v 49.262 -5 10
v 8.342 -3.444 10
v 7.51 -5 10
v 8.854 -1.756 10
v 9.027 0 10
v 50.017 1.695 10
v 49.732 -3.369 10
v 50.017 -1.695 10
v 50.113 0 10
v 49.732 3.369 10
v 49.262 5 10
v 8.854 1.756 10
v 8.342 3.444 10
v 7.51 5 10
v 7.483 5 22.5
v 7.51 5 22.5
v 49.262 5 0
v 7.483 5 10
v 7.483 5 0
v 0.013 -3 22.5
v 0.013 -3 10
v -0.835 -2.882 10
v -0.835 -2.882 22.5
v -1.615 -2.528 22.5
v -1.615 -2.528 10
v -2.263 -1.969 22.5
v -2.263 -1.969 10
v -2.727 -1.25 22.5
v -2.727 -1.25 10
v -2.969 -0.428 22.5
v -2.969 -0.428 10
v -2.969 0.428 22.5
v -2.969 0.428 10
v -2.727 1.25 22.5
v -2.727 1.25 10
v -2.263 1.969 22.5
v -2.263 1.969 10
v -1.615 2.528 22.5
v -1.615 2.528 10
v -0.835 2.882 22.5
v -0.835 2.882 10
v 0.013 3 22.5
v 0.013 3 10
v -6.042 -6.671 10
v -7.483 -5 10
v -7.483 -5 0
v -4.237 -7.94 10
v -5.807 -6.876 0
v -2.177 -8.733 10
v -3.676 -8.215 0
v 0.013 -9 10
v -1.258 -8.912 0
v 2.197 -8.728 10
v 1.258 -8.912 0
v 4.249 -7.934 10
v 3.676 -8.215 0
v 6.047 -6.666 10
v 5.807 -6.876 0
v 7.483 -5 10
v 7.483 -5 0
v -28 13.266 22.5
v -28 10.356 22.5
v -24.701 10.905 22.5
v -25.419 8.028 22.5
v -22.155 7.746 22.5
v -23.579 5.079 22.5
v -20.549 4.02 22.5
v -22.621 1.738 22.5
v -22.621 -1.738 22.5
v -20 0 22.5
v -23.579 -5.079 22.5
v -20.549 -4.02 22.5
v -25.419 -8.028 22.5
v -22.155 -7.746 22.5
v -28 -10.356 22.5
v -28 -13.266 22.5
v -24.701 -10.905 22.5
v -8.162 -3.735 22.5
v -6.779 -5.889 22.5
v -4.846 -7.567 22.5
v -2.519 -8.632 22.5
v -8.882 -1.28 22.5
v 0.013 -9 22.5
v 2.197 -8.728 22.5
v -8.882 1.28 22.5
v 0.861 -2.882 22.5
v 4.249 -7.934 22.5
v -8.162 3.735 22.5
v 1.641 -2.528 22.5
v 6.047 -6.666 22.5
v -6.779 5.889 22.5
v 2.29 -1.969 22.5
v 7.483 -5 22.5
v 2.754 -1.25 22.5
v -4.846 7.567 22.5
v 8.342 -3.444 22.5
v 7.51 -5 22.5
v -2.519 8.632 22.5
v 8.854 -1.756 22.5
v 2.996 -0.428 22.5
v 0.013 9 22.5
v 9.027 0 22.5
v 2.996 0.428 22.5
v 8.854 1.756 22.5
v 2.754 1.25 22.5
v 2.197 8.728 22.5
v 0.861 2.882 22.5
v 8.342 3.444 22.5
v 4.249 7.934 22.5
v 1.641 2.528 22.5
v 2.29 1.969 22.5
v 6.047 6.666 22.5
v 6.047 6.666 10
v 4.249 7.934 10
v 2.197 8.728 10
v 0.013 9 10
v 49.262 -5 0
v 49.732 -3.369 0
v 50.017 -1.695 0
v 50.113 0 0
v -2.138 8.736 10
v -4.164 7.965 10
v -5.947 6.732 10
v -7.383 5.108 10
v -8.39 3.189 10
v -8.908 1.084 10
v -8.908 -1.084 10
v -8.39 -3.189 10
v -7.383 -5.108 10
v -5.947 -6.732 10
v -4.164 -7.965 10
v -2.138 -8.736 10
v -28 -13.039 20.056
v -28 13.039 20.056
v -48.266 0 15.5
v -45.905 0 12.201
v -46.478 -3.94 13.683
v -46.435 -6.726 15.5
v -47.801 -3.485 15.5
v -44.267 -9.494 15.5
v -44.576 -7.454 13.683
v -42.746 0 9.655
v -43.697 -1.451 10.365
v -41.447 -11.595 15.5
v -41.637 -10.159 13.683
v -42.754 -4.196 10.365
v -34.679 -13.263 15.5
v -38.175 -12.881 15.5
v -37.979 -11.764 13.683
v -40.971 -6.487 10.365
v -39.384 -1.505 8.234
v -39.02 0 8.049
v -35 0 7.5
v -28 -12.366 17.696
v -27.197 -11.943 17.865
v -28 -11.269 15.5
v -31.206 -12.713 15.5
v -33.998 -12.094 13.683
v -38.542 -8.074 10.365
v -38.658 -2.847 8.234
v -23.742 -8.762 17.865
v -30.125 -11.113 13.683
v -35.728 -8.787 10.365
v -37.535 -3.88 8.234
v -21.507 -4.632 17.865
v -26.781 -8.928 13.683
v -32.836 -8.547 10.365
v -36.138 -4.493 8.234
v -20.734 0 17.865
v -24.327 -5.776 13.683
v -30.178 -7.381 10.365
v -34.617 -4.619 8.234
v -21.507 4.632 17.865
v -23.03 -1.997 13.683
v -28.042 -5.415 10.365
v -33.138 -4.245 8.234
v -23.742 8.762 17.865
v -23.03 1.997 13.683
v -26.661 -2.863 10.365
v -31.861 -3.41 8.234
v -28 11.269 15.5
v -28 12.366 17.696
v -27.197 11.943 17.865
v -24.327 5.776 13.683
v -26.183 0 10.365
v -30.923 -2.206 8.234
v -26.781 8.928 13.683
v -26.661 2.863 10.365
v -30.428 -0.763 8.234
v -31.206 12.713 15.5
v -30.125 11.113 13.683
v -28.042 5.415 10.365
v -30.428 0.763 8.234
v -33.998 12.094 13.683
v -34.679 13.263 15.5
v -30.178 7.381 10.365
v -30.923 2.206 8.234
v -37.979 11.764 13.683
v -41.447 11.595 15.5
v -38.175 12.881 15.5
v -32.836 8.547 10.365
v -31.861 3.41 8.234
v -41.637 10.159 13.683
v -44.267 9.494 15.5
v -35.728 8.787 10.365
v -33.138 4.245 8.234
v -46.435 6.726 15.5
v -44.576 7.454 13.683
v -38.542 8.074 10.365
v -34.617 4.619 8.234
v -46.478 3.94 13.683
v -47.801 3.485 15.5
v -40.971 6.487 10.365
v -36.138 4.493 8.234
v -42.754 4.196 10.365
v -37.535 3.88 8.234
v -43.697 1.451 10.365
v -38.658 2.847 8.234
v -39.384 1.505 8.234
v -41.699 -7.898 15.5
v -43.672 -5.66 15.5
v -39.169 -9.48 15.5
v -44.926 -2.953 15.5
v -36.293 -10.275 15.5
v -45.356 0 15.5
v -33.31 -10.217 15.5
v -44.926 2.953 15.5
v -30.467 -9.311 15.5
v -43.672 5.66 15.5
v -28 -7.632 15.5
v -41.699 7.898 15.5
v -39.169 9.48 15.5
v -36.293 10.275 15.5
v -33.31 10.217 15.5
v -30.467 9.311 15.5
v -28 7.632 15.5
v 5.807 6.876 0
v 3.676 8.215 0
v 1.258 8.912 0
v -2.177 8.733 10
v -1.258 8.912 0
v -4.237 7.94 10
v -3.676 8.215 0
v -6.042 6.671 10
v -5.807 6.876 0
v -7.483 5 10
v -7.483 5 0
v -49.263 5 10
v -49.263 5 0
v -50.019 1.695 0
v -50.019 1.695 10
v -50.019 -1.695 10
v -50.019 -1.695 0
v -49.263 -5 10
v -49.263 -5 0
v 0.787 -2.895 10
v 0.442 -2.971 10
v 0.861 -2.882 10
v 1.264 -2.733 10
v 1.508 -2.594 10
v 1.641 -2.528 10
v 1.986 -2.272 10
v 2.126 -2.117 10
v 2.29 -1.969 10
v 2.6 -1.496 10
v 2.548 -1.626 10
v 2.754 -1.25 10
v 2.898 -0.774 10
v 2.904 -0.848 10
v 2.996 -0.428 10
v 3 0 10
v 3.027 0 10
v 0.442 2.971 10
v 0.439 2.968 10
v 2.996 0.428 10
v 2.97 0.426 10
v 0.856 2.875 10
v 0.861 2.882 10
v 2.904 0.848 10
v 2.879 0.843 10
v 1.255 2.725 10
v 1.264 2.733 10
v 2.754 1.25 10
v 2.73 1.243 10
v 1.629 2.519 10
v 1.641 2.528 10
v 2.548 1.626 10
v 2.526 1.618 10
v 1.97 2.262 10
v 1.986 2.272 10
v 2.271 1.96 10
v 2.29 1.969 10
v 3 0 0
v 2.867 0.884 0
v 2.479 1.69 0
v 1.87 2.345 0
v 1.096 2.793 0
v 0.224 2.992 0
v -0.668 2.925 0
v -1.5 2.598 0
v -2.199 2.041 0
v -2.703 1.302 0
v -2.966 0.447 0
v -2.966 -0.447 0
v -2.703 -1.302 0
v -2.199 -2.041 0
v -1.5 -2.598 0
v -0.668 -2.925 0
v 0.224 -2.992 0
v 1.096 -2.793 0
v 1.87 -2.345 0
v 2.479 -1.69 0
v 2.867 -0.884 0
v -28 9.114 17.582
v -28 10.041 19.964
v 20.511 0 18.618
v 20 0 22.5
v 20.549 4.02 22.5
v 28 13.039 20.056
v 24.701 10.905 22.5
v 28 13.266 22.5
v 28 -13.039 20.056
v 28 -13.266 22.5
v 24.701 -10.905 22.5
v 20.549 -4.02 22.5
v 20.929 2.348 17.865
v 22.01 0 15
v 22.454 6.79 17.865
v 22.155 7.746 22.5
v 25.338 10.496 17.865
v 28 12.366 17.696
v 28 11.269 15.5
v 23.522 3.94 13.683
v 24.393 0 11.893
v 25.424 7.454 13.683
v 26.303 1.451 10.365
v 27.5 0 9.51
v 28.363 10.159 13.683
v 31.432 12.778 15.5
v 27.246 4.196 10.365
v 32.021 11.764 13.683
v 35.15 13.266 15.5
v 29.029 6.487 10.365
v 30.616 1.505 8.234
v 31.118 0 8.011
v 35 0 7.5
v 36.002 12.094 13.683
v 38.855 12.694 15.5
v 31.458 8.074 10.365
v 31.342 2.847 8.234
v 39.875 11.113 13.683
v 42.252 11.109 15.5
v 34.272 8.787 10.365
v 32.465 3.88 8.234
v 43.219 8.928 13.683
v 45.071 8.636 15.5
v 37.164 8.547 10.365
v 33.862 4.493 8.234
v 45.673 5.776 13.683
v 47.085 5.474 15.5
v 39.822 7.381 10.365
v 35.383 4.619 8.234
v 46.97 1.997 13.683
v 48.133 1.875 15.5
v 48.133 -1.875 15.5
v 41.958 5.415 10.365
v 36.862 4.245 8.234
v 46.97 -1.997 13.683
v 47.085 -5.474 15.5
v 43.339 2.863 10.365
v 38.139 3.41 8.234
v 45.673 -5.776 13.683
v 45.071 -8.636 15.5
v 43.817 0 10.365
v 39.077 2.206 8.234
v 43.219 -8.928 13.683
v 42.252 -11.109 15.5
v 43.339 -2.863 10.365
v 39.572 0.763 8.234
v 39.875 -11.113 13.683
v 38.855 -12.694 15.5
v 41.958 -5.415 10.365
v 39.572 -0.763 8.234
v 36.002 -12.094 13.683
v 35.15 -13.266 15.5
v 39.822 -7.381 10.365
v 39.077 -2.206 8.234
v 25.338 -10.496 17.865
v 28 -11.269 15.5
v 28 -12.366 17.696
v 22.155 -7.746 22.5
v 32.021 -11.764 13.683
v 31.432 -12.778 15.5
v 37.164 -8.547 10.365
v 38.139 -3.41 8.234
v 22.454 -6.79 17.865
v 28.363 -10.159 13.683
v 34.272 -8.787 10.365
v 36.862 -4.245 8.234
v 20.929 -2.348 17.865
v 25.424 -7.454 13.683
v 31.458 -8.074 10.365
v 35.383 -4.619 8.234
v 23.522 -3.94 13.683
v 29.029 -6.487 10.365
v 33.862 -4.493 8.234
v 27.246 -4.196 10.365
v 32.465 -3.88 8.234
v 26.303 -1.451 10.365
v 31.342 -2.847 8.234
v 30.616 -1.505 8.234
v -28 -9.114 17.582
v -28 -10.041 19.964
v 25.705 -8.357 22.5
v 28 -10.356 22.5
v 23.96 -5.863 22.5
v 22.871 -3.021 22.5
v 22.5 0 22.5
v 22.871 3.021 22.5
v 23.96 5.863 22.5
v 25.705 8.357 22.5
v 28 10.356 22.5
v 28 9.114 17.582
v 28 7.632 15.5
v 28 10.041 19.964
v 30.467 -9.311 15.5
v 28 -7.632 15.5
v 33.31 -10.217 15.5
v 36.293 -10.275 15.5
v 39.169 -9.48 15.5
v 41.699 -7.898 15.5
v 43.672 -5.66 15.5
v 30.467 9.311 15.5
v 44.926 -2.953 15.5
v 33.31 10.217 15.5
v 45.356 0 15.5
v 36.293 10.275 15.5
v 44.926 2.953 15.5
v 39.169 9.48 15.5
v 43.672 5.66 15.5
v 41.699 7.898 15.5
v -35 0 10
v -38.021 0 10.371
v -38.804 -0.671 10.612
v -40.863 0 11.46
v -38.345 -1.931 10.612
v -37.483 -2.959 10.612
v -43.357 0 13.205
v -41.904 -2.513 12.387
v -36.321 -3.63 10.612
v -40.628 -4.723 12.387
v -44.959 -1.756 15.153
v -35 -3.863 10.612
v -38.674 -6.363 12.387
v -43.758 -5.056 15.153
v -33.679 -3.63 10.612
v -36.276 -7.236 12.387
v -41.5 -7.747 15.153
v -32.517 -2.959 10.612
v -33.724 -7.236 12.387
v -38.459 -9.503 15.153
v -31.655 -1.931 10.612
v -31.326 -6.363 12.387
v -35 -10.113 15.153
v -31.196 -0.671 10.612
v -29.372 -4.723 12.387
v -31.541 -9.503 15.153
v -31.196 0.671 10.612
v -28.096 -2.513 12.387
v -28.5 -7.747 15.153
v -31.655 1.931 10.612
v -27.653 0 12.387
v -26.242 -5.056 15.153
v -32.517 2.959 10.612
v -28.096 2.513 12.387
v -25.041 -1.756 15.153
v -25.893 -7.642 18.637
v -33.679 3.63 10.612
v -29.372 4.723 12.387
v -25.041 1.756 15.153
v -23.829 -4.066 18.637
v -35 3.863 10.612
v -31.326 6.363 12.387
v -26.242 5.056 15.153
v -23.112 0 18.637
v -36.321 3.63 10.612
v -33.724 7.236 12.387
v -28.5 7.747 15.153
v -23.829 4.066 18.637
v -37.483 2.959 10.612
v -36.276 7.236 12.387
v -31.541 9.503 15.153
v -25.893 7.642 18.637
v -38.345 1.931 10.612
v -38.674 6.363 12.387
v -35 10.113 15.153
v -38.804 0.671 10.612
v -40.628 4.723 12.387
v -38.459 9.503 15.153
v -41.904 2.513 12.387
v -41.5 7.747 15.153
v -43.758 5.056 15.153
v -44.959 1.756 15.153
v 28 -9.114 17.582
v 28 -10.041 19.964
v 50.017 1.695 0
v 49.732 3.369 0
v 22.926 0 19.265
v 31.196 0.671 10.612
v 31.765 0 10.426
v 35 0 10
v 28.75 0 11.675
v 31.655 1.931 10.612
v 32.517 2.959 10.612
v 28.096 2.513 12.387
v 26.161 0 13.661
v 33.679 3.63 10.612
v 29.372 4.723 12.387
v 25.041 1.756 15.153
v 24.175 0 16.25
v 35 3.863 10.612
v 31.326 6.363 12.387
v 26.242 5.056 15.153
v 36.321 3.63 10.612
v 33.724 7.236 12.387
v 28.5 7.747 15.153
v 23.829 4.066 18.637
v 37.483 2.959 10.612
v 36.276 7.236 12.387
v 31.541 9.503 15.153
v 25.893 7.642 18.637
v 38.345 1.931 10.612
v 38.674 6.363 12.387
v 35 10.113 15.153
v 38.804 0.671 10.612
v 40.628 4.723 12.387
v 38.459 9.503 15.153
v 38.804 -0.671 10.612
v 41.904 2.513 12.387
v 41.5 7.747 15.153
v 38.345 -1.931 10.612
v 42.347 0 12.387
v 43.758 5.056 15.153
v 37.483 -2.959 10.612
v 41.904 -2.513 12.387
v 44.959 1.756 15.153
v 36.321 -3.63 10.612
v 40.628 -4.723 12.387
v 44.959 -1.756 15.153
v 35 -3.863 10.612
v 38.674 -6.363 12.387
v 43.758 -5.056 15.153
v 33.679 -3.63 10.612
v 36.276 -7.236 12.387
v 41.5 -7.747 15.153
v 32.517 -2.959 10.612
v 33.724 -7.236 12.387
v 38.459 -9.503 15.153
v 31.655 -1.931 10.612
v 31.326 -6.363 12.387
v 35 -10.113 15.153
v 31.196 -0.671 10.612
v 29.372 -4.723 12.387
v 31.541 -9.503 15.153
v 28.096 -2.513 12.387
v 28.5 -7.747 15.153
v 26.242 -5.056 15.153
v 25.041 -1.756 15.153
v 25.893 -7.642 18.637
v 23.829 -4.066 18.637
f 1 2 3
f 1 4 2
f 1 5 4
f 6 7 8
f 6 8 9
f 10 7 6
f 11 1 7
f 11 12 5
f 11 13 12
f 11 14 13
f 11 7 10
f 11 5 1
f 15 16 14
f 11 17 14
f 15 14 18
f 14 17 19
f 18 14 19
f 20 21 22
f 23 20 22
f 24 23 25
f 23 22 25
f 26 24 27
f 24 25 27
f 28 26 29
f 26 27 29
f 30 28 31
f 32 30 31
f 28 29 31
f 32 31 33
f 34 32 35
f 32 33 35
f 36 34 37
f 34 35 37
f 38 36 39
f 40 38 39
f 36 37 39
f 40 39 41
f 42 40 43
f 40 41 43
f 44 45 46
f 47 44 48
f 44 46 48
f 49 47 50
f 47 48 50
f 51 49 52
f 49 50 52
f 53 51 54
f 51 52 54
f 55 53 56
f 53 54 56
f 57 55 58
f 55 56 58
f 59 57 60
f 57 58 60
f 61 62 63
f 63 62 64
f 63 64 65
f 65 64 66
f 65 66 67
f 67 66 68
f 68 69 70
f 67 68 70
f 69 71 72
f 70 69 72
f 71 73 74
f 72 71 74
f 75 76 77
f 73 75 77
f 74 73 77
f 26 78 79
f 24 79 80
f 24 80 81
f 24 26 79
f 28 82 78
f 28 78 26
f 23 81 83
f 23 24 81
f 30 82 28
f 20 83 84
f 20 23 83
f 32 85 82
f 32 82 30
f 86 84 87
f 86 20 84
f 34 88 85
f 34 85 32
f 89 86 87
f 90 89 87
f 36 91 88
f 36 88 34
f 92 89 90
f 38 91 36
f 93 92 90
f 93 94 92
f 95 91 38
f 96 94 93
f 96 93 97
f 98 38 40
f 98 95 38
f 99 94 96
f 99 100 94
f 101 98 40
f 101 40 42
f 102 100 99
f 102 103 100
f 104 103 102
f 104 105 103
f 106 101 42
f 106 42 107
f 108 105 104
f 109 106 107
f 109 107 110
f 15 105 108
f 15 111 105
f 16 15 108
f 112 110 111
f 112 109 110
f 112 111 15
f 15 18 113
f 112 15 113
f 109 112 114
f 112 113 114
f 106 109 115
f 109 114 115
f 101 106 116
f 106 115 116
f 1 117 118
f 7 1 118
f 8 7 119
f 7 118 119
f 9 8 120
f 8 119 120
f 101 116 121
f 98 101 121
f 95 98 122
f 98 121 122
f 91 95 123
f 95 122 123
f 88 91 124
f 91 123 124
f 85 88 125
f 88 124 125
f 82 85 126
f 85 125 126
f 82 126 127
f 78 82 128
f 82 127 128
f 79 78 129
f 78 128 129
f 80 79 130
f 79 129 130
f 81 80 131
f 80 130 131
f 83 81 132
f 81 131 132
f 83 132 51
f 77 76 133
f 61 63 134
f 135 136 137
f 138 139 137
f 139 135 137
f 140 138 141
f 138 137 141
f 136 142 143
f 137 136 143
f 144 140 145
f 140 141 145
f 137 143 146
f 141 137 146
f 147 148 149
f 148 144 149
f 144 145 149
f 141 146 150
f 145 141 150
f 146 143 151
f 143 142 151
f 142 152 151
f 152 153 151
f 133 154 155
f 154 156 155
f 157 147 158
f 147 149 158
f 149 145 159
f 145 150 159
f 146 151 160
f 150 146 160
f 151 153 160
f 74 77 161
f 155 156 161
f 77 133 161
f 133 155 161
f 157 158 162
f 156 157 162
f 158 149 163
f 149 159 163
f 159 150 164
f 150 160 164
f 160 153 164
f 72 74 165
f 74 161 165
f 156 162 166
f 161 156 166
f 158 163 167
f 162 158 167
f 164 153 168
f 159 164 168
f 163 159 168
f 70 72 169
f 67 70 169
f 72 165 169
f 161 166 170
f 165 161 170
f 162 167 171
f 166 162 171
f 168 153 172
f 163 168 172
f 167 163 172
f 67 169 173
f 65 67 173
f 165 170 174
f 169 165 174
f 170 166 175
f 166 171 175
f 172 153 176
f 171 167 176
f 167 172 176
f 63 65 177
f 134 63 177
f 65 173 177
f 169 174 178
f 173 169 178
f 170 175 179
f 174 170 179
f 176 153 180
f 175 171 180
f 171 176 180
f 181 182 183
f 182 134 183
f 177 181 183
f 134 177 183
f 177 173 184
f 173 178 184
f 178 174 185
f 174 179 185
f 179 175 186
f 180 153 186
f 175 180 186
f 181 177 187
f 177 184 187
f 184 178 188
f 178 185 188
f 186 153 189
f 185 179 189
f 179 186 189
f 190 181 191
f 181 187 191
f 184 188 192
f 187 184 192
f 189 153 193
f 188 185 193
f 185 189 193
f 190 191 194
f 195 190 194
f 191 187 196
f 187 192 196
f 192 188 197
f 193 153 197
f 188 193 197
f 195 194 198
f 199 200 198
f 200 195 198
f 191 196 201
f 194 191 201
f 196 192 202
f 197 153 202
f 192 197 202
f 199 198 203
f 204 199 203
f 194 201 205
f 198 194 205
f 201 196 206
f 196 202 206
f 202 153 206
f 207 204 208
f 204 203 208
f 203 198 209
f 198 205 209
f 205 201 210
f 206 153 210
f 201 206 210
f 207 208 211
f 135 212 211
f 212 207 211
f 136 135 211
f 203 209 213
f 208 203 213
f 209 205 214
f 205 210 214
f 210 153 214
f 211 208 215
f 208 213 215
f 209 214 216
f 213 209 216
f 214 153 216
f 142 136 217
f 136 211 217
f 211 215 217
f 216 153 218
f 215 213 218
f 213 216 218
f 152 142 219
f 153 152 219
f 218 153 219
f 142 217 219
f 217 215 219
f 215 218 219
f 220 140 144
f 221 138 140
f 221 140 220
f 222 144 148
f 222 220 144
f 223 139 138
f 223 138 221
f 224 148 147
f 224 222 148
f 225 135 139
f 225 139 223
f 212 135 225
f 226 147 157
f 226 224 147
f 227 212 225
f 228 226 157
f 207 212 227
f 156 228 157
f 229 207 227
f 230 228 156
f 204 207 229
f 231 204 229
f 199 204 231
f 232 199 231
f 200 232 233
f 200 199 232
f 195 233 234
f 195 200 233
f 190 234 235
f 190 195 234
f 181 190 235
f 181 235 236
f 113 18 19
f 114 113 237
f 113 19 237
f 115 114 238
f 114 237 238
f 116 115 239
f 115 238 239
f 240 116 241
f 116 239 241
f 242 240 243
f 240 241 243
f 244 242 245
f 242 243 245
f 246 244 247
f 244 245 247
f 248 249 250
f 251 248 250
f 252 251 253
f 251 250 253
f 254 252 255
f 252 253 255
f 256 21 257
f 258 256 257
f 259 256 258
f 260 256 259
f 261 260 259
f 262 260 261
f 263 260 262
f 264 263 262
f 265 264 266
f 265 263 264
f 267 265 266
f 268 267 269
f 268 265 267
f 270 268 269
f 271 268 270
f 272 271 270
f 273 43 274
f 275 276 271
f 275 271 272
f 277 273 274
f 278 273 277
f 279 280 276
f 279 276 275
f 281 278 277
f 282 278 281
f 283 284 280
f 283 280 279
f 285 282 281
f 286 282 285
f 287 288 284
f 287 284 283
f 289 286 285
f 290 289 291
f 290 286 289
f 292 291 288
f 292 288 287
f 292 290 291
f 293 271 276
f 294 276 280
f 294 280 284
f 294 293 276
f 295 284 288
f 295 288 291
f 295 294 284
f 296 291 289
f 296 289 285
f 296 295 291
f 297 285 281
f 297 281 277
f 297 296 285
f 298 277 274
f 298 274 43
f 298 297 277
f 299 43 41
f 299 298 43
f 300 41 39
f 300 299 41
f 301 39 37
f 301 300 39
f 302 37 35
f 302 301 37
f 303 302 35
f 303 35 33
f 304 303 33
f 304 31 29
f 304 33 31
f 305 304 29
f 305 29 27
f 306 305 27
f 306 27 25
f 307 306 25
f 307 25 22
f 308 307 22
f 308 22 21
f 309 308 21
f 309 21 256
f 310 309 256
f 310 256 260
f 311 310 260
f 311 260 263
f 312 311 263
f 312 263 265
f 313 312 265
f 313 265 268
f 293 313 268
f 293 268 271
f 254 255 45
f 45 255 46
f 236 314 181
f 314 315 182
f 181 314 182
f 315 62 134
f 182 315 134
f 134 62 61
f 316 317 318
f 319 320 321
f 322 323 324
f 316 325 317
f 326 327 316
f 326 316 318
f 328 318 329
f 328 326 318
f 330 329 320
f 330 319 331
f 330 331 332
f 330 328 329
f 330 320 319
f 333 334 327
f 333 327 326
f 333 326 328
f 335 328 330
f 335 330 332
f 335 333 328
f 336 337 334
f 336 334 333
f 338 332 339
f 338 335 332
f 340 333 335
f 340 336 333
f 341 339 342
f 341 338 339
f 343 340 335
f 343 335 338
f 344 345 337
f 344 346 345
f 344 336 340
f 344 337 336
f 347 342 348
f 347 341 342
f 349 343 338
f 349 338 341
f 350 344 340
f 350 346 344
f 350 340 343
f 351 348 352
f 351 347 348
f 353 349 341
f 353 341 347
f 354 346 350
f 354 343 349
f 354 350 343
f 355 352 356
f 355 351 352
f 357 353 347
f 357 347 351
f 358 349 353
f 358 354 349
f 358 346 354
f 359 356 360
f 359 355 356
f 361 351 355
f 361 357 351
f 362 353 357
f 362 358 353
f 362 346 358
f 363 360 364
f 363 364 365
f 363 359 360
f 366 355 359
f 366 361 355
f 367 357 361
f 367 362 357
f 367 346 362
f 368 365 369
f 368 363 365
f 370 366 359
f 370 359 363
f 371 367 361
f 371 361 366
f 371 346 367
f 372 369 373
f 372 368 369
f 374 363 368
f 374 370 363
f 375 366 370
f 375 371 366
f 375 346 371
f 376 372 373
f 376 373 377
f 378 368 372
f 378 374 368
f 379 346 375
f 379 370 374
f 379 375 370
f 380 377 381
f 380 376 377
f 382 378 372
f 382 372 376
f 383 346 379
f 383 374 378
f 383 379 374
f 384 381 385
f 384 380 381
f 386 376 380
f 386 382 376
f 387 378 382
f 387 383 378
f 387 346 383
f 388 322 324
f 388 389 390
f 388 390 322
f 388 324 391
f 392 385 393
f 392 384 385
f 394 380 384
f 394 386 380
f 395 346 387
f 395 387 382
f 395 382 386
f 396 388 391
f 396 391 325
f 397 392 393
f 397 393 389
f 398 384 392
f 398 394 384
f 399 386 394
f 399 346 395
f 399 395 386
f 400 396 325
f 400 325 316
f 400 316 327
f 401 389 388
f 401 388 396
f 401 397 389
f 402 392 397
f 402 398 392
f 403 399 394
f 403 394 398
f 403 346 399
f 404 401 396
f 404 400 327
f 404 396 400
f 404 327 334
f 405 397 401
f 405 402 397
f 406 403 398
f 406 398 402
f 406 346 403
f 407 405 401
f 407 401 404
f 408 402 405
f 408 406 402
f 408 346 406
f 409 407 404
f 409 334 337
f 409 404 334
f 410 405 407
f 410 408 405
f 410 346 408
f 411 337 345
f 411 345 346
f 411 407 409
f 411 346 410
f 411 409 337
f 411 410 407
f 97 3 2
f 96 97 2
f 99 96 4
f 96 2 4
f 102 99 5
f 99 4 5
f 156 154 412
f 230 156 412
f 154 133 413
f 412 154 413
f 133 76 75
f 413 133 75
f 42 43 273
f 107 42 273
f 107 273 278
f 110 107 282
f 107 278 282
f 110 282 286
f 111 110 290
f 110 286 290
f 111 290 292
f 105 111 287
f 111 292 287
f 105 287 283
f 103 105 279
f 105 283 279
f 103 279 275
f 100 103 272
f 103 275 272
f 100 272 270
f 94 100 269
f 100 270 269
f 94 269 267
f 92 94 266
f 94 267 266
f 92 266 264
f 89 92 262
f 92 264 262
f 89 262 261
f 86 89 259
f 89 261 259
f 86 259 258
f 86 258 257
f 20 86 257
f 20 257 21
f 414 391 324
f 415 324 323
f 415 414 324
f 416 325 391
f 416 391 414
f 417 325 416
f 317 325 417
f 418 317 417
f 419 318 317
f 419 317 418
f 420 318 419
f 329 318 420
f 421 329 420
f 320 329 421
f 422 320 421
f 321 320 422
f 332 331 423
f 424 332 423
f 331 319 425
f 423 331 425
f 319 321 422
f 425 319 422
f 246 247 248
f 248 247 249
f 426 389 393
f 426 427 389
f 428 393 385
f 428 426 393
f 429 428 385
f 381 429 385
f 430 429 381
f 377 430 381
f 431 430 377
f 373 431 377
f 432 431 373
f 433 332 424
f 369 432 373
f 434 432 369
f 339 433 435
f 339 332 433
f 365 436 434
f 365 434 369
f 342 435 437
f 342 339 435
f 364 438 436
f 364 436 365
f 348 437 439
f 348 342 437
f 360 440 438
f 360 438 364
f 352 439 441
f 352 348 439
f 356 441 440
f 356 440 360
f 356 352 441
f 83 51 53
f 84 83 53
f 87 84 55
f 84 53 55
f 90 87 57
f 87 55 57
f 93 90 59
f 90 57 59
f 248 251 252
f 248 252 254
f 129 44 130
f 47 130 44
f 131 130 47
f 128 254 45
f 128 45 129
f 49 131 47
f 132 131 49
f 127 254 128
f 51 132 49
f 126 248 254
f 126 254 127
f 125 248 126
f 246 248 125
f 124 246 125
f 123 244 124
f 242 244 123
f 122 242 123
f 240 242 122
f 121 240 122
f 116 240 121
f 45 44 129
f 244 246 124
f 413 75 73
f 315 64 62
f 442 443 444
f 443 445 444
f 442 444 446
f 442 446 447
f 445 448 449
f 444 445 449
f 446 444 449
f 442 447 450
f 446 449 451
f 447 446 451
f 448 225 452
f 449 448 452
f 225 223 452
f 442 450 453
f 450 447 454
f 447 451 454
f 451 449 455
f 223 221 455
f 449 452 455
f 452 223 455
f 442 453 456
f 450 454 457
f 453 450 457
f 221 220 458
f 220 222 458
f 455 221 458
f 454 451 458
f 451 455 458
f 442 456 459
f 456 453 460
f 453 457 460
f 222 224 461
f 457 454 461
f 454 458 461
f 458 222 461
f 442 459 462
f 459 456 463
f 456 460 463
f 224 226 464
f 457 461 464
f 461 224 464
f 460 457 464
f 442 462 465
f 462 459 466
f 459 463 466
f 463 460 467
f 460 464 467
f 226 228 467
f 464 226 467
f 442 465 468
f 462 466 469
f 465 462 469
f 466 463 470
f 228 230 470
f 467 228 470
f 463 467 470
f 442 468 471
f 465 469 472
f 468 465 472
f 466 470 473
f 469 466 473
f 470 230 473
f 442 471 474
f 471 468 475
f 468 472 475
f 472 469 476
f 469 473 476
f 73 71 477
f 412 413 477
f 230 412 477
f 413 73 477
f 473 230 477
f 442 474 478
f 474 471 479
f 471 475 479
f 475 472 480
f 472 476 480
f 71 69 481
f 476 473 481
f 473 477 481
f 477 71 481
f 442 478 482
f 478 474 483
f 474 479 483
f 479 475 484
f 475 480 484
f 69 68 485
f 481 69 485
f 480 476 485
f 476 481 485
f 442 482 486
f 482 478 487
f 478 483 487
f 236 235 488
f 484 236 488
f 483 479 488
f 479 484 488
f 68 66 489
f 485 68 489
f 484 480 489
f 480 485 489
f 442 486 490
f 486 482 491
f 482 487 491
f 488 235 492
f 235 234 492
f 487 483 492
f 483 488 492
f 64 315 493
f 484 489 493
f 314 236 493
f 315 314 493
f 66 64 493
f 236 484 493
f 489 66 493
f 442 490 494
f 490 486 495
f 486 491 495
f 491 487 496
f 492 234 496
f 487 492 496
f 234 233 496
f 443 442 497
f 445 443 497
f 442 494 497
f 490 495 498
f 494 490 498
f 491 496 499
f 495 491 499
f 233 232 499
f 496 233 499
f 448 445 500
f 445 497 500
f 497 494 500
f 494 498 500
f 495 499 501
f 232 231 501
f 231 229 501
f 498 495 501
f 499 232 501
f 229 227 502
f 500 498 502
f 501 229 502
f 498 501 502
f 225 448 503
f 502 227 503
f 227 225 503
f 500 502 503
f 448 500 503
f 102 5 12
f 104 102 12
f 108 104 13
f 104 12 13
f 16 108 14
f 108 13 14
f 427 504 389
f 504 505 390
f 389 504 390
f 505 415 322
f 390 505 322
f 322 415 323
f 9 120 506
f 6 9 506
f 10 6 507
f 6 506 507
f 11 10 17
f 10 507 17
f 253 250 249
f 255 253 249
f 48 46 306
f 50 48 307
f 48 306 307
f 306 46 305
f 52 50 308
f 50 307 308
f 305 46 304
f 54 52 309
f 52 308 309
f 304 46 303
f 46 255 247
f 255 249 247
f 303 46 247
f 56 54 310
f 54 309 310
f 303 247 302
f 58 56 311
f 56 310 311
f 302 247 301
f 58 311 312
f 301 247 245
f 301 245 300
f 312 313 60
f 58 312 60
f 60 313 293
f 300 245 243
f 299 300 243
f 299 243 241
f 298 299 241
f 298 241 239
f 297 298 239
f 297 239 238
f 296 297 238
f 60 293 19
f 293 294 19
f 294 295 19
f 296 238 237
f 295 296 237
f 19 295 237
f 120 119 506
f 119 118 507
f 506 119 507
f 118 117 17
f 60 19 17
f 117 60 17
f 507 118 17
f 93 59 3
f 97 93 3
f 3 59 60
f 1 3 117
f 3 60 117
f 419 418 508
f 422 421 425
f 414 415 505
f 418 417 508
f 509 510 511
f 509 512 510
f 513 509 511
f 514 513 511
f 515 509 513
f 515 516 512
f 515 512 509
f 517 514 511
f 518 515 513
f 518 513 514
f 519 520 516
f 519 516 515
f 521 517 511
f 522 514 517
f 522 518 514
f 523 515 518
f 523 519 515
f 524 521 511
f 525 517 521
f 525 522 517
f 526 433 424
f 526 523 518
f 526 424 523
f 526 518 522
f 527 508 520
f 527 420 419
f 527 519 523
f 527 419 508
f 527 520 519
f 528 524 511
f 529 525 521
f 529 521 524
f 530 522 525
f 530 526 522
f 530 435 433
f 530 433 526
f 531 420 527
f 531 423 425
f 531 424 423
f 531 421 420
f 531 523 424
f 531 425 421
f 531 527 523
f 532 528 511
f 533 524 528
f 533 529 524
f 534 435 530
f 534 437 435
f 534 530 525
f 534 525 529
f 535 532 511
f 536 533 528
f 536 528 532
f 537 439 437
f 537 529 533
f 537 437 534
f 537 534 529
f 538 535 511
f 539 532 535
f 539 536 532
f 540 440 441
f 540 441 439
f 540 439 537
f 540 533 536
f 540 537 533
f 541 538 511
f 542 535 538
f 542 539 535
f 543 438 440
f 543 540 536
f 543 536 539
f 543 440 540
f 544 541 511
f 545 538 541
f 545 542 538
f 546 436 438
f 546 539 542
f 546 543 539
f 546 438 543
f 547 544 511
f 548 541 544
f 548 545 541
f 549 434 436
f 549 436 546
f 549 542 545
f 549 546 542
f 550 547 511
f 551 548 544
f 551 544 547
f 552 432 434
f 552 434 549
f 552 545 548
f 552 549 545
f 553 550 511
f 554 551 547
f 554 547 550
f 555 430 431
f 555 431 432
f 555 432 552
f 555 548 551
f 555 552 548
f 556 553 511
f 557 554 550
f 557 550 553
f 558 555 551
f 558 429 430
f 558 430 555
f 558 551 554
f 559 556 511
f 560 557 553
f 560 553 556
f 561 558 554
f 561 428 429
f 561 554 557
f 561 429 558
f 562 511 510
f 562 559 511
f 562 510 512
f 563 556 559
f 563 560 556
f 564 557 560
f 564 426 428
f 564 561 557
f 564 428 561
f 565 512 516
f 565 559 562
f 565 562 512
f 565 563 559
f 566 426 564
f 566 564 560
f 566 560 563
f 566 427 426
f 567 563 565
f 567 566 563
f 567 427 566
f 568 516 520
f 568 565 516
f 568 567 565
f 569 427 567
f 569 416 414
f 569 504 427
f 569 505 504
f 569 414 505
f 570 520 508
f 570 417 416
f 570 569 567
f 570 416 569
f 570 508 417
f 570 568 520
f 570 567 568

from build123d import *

# Parameters (mm, degrees)
F1_R     = 3
F2_DEPTH = 10
F6_W     = 34.5020639661
F6_H     = 49.154933542
F7_DEPTH = 7
F9_DEPTH = 12.5


with BuildPart() as f2:
    # F1 (on Top) → F2 (new body)
    with BuildSketch(Plane.XY):
        with BuildLine():
            ThreePointArc((46.4564392374, 5), (47.2363289116, 2.5538705461), (47.5, 0))
            ThreePointArc((47.5, 0), (47.2363289116, -2.5538705461), (46.4564392374, -5))
            Line((46.4564392374, -5), (49.2615084811, -5))
            ThreePointArc((49.2615084811, -5), (49.8983064719, -2.5359590739), (50.1125981935, 0))
            ThreePointArc((50.1125981935, 0), (49.8983064719, 2.5359590739), (49.2615084811, 5))
            Line((49.2615084811, 5), (46.4564392374, 5))
        make_face()
        with BuildLine():
            Line((-46.4564392374, 5), (-49.2629836635, 5))
            ThreePointArc((-49.2629836635, 5), (-50.1139903065, 0), (-49.2629836635, -5))
            Line((-49.2629836635, -5), (-46.4564392374, -5))
            ThreePointArc((-46.4564392374, -5), (-47.5, 0), (-46.4564392374, 5))
        make_face()
        with BuildLine():
            ThreePointArc((-22.5, 0), (-22.7636710884, 2.5538705461), (-23.5435607626, 5))
            Line((-23.5435607626, 5), (-46.4564392374, 5))
            ThreePointArc((-46.4564392374, 5), (-47.5, 0), (-46.4564392374, -5))
            Line((-46.4564392374, -5), (-23.5435607626, -5))
            ThreePointArc((-23.5435607626, -5), (-22.7636710884, -2.5538705461), (-22.5, 0))
        make_face()
        with BuildLine():
            ThreePointArc((-19.8860096935, 0), (-20.1002802071, 2.5359521046), (-20.7370163365, 5))
            Line((-20.7370163365, 5), (-23.5435607626, 5))
            ThreePointArc((-23.5435607626, 5), (-22.7636710884, 2.5538705461), (-22.5, 0))
            ThreePointArc((-22.5, 0), (-22.7636710884, -2.5538705461), (-23.5435607626, -5))
            Line((-23.5435607626, -5), (-20.7370163365, -5))
            ThreePointArc((-20.7370163365, -5), (-20.1002802071, -2.5359521046), (-19.8860096935, 0))
        make_face()
        with BuildLine():
            ThreePointArc((-7.4833147735, -5), (-9, 0), (-7.4833147735, 5))
            Line((-7.4833147735, 5), (-20.7370163365, 5))
            ThreePointArc((-20.7370163365, 5), (-20.1002802071, 2.5359521046), (-19.8860096935, 0))
            ThreePointArc((-19.8860096935, 0), (-20.1002802071, -2.5359521046), (-20.7370163365, -5))
            Line((-20.7370163365, -5), (-7.4833147735, -5))
        make_face()
        with BuildLine():
            ThreePointArc((9, 0), (8.6124860802, 2.6124860802), (7.4833147735, 5))
            Line((7.4833147735, 5), (-7.4833147735, 5))
            ThreePointArc((-7.4833147735, 5), (-9, 0), (-7.4833147735, -5))
            Line((-7.4833147735, -5), (7.4833147735, -5))
            ThreePointArc((7.4833147735, -5), (8.6124860802, -2.6124860802), (9, 0))
        make_face()
        Circle(F1_R, mode=Mode.SUBTRACT)
        with BuildLine():
            ThreePointArc((20.7384915189, -5), (19.8874018065, 0), (20.7384915189, 5))
            Line((20.7384915189, 5), (7.4833147735, 5))
            ThreePointArc((7.4833147735, 5), (8.6124860802, 2.6124860802), (9, 0))
            ThreePointArc((9, 0), (8.6124860802, -2.6124860802), (7.4833147735, -5))
            Line((7.4833147735, -5), (20.7384915189, -5))
        make_face()
        with BuildLine():
            ThreePointArc((23.5435607626, -5), (22.5, 0), (23.5435607626, 5))
            Line((23.5435607626, 5), (20.7384915189, 5))
            ThreePointArc((20.7384915189, 5), (19.8874018065, 0), (20.7384915189, -5))
            Line((20.7384915189, -5), (23.5435607626, -5))
        make_face()
        with BuildLine():
            ThreePointArc((46.4564392374, -5), (47.2363289116, -2.5538705461), (47.5, 0))
            ThreePointArc((47.5, 0), (47.2363289116, 2.5538705461), (46.4564392374, 5))
            Line((46.4564392374, 5), (23.5435607626, 5))
            ThreePointArc((23.5435607626, 5), (22.5, 0), (23.5435607626, -5))
            Line((23.5435607626, -5), (46.4564392374, -5))
        make_face()
        with BuildLine():
            Line((-7.4833147735, 5), (7.4833147735, 5))
            ThreePointArc((7.4833147735, 5), (0, 9), (-7.4833147735, 5))
        make_face()
        with BuildLine():
            ThreePointArc((-7.4833147735, -5), (0, -9), (7.4833147735, -5))
            Line((7.4833147735, -5), (-7.4833147735, -5))
        make_face()
    extrude(amount=F2_DEPTH)

    # F8 (on face) → F9 (join)
    with BuildSketch(Plane.XY.offset(10)):
        with BuildLine():
            ThreePointArc((9.0266954303, 0), (8.6391815104, 2.6124860802), (7.5100102038, 5))
            Line((7.5100102038, 5), (7.4833147735, 5))
            ThreePointArc((7.4833147735, 5), (4.2485253114, 7.9341056634), (0.0133477151, 8.9999901021))
            ThreePointArc((0.0133477151, 8.9999901021), (-8.9733045697, 0), (0.0133477151, -8.9999901021))
            ThreePointArc((0.0133477151, -8.9999901021), (4.2485253114, -7.9341056634), (7.4833147735, -5))
            Line((7.4833147735, -5), (7.5100102038, -5))
            ThreePointArc((7.5100102038, -5), (8.6391815104, -2.6124860802), (9.0266954303, 0))
        make_face()
        with BuildLine():
            ThreePointArc((0.0133477151, 2.9999703063), (2.1432913831, 2.126034236), (3.0266954303, 0))
            ThreePointArc((3.0266954303, 0), (2.1432913831, -2.126034236), (0.0133477151, -2.9999703063))
            ThreePointArc((0.0133477151, -2.9999703063), (-3, 0), (0.0133477151, 2.9999703063))
        make_face(mode=Mode.SUBTRACT)
    extrude(amount=F9_DEPTH)


with BuildPart() as f4:
    # F3 (on Front) → F4 (revolve)
    with BuildSketch(Plane.XZ):
        with BuildLine():
            Line((-47.5, 22.5), (-50, 22.5))
            ThreePointArc((-50, 22.5), (-45.6066017178, 11.8933982822), (-35, 7.5))
            Line((-35, 7.5), (-35, 10))
            ThreePointArc((-35, 10), (-43.8388347648, 13.6611652352), (-47.5, 22.5))
        make_face()
    revolve(axis=Axis((-35, 0, 15.5329470341), (0, 0, 1)))


with BuildPart() as f5:
    # F3 (on Front) → F5 (revolve)
    with BuildSketch(Plane.XZ):
        with BuildLine():
            Line((22.5, 22.5), (20, 22.5))
            ThreePointArc((20, 22.5), (24.3933982822, 11.8933982822), (35, 7.5))
            Line((35, 7.5), (35, 10))
            ThreePointArc((35, 10), (26.1611652352, 13.6611652352), (22.5, 22.5))
        make_face()
    revolve(axis=Axis((35, 0, 11.25), (0, 0, -1)))


with BuildPart() as f7_tool:
    # F6 (on face) → F7 (new body)
    with BuildSketch(Plane.XY.offset(22.5)):
        with BuildLine():
            Line((28, 25.6732665002), (28, 13.2664991614))
            ThreePointArc((28, 13.2664991614), (42.7459666924, 12.8452325787), (50, 0))
            ThreePointArc((50, 0), (42.7459666924, -12.8452325787), (28, -13.2664991614))
            Line((28, -13.2664991614), (28, -23.4816670418))
            Line((28, -23.4816670418), (60.3903114407, -23.4816670418))
            Line((60.3903114407, -23.4816670418), (60.3903114407, 25.6732665002))
            Line((60.3903114407, 25.6732665002), (28, 25.6732665002))
        make_face()
        with Locations((-45.251031983, 1.0957997292)):
            Rectangle(F6_W, F6_H)
        with BuildLine():
            Line((28, 10.3561575886), (28, 0))
            Line((28, 0), (28, -10.3561575886))
            ThreePointArc((28, -10.3561575886), (40.8630196998, -11.0397010829), (47.5, 0))
            ThreePointArc((47.5, 0), (40.8630196998, 11.0397010829), (28, 10.3561575886))
        make_face()
        with BuildLine():
            Line((28, 13.2664991614), (28, 10.3561575886))
            ThreePointArc((28, 10.3561575886), (40.8630196998, 11.0397010829), (47.5, 0))
            ThreePointArc((47.5, 0), (40.8630196998, -11.0397010829), (28, -10.3561575886))
            Line((28, -10.3561575886), (28, -13.2664991614))
            ThreePointArc((28, -13.2664991614), (42.7459666924, -12.8452325787), (50, 0))
            ThreePointArc((50, 0), (42.7459666924, 12.8452325787), (28, 13.2664991614))
        make_face()
    extrude(amount=-F7_DEPTH)


with BuildPart() as f4_1:
    add(f4.part)

    # F7: cut by f7_tool
    add(f7_tool.part, mode=Mode.SUBTRACT)


with BuildPart() as f5_1:
    add(f5.part)

    # F7: cut by f7_tool
    add(f7_tool.part, mode=Mode.SUBTRACT)


solid = Compound([f2.part, f4_1.part, f5_1.part])
